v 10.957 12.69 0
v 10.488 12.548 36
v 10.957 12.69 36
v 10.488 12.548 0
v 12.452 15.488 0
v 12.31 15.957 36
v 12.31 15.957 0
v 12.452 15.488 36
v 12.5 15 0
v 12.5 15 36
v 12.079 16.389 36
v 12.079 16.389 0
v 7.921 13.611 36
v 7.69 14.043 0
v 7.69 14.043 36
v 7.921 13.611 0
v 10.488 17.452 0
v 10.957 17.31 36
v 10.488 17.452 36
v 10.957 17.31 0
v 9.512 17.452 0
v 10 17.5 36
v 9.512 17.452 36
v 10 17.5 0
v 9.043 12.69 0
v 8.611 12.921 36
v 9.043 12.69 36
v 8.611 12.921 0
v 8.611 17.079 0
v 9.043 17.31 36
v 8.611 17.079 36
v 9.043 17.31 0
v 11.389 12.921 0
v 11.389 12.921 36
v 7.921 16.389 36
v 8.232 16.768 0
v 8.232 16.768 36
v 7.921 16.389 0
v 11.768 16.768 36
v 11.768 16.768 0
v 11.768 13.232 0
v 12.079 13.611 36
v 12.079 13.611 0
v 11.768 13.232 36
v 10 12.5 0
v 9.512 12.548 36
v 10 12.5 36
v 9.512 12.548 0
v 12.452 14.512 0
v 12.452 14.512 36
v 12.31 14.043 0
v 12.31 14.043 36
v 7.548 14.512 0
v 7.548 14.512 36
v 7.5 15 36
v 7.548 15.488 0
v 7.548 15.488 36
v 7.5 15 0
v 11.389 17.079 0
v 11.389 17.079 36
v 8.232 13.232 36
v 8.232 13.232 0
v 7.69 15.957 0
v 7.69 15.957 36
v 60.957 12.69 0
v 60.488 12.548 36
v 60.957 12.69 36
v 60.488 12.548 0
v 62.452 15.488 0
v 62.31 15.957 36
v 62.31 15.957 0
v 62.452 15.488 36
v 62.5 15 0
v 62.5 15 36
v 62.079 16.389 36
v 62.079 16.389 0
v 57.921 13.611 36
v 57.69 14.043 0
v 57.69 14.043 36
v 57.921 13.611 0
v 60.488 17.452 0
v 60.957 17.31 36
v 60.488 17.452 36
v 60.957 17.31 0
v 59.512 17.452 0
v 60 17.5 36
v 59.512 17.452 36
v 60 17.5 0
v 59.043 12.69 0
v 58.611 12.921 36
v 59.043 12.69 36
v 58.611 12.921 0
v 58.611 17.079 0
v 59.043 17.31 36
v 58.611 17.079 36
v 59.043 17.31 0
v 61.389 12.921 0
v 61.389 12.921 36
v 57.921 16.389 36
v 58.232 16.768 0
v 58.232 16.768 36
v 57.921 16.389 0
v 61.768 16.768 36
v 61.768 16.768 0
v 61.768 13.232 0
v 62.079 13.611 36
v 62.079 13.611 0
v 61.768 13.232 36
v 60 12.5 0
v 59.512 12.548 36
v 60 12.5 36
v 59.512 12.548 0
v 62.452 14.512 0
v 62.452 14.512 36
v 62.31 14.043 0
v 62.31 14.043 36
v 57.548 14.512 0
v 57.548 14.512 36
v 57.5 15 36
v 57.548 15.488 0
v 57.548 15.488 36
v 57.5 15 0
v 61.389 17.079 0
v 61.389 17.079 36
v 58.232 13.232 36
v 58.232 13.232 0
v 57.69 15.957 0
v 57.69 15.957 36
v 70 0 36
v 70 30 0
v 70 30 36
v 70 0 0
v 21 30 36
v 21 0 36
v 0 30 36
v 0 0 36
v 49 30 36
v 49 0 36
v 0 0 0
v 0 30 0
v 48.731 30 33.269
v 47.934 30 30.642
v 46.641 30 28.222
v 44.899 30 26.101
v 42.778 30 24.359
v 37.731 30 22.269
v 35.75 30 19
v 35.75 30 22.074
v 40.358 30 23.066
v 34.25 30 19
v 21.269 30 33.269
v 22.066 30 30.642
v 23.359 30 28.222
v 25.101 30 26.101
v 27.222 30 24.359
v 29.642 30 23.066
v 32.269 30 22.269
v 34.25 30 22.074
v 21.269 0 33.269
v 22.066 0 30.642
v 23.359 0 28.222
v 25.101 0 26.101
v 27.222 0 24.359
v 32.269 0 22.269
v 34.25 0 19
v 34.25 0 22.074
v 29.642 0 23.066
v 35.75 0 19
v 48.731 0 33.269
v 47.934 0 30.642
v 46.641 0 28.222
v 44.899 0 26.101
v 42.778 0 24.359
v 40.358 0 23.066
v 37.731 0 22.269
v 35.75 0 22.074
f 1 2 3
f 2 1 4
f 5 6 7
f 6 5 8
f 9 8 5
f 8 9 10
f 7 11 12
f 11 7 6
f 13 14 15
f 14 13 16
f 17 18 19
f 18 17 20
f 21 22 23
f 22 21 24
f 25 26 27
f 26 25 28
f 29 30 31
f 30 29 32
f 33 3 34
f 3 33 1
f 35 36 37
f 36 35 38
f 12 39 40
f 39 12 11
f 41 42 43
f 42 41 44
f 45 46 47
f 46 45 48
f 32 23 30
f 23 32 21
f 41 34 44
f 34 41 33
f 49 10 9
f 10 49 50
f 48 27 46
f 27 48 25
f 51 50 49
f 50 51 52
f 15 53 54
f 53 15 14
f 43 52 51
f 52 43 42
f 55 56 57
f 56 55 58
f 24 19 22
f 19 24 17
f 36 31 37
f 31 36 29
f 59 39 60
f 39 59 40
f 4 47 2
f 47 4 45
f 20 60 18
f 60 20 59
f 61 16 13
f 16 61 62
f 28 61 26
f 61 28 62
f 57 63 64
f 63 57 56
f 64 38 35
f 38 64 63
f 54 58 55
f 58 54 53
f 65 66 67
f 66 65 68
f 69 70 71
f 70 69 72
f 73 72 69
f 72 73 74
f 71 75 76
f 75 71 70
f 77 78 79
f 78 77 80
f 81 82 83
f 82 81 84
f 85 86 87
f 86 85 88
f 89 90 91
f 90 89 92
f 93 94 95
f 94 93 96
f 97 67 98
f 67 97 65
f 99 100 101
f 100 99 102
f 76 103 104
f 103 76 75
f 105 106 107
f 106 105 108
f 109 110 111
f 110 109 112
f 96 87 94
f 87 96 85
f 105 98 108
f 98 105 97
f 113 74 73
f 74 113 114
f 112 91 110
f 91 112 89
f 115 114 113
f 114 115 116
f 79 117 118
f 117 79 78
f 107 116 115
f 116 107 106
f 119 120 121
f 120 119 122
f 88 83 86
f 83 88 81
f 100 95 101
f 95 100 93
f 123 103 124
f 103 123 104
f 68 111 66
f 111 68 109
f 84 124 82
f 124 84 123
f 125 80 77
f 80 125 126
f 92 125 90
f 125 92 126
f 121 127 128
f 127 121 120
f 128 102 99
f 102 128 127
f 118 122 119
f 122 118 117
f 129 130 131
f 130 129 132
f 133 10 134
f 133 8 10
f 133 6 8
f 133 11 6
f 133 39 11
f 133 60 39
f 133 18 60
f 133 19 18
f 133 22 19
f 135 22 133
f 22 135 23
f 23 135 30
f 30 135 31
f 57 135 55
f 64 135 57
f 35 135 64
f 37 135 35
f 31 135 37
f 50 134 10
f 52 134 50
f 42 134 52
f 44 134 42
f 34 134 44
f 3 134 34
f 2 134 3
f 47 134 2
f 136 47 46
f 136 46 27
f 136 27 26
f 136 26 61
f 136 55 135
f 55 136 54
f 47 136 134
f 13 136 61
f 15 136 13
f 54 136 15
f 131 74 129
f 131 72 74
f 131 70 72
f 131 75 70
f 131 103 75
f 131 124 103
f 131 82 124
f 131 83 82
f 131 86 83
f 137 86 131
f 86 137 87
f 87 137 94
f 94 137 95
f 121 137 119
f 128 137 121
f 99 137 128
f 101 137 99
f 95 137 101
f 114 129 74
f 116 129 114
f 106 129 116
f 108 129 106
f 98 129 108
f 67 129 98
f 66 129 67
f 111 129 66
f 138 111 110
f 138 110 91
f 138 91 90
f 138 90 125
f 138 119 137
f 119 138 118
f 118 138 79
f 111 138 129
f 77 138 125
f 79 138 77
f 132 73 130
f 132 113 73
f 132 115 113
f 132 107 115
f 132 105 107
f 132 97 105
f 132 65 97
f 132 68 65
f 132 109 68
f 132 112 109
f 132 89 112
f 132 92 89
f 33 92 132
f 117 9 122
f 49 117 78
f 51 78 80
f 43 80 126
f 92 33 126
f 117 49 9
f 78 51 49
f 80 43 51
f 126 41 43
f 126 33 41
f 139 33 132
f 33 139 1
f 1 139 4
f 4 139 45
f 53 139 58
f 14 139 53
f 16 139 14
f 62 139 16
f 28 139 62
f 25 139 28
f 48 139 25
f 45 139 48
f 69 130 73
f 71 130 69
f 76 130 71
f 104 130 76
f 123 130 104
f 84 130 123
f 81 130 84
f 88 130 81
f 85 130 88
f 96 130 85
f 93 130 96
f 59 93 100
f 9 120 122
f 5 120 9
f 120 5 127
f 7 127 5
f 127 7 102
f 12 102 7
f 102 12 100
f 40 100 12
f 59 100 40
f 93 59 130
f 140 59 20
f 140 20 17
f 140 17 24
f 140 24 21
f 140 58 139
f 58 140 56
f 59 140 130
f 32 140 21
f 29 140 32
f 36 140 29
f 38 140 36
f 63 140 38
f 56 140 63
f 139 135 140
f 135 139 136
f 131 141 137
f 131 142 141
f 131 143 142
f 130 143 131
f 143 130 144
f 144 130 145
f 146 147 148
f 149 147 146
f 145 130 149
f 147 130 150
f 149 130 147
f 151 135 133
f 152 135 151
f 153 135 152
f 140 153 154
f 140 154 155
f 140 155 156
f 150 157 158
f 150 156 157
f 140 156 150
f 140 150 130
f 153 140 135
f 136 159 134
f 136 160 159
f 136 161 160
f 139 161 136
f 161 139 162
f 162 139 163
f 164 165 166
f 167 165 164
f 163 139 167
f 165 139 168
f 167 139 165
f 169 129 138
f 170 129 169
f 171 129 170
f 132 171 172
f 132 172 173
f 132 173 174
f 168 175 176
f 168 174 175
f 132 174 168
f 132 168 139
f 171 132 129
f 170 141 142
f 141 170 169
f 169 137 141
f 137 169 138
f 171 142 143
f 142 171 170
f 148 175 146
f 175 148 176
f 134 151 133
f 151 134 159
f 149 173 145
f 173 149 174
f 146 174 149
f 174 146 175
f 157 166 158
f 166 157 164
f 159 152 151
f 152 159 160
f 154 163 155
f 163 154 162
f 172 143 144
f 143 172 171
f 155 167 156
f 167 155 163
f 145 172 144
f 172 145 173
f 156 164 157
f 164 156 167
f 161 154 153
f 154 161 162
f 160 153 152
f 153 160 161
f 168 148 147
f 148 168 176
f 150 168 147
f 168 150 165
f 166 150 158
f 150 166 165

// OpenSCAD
$fn = 32;

// ----------------------------------------------------------------------
// Saddle clamp: split shaft clamp
// ----------------------------------------------------------------------

// --- parameters (mm) ---
blk_l = 70;               // block length, X
blk_w = 30;               // block width, Y
blk_h = 36;               // block height
clamp_r = 14;             // shaft groove radius
hole_r = 2.5;             // bolt hole radius
hole_m = 10;              // bolt hole margin from the ends
saw_w = 1.5;              // saw kerf width
fit_tol = 0.05;           // tolerance for press fits, mm
free_tol = 0.2;           // tolerance for clearance fits, mm

saw_depth = clamp_r + 3;  // saw kerf depth

difference() {
  cube([blk_l, blk_w, blk_h]);
  translate([blk_l / 2, -1, blk_h])
    rotate([-90, 0, 0])
      cylinder(h = blk_w + 2, r = clamp_r);
  for (sx = [0, 1])
    translate([sx ? blk_l - hole_m : hole_m, blk_w / 2, -1])
      cylinder(r = hole_r, h = blk_h + 2);
  translate([blk_l / 2 - saw_w / 2, -1, blk_h - saw_depth])
    cube([saw_w, blk_w + 2, saw_depth + 1]);
}
